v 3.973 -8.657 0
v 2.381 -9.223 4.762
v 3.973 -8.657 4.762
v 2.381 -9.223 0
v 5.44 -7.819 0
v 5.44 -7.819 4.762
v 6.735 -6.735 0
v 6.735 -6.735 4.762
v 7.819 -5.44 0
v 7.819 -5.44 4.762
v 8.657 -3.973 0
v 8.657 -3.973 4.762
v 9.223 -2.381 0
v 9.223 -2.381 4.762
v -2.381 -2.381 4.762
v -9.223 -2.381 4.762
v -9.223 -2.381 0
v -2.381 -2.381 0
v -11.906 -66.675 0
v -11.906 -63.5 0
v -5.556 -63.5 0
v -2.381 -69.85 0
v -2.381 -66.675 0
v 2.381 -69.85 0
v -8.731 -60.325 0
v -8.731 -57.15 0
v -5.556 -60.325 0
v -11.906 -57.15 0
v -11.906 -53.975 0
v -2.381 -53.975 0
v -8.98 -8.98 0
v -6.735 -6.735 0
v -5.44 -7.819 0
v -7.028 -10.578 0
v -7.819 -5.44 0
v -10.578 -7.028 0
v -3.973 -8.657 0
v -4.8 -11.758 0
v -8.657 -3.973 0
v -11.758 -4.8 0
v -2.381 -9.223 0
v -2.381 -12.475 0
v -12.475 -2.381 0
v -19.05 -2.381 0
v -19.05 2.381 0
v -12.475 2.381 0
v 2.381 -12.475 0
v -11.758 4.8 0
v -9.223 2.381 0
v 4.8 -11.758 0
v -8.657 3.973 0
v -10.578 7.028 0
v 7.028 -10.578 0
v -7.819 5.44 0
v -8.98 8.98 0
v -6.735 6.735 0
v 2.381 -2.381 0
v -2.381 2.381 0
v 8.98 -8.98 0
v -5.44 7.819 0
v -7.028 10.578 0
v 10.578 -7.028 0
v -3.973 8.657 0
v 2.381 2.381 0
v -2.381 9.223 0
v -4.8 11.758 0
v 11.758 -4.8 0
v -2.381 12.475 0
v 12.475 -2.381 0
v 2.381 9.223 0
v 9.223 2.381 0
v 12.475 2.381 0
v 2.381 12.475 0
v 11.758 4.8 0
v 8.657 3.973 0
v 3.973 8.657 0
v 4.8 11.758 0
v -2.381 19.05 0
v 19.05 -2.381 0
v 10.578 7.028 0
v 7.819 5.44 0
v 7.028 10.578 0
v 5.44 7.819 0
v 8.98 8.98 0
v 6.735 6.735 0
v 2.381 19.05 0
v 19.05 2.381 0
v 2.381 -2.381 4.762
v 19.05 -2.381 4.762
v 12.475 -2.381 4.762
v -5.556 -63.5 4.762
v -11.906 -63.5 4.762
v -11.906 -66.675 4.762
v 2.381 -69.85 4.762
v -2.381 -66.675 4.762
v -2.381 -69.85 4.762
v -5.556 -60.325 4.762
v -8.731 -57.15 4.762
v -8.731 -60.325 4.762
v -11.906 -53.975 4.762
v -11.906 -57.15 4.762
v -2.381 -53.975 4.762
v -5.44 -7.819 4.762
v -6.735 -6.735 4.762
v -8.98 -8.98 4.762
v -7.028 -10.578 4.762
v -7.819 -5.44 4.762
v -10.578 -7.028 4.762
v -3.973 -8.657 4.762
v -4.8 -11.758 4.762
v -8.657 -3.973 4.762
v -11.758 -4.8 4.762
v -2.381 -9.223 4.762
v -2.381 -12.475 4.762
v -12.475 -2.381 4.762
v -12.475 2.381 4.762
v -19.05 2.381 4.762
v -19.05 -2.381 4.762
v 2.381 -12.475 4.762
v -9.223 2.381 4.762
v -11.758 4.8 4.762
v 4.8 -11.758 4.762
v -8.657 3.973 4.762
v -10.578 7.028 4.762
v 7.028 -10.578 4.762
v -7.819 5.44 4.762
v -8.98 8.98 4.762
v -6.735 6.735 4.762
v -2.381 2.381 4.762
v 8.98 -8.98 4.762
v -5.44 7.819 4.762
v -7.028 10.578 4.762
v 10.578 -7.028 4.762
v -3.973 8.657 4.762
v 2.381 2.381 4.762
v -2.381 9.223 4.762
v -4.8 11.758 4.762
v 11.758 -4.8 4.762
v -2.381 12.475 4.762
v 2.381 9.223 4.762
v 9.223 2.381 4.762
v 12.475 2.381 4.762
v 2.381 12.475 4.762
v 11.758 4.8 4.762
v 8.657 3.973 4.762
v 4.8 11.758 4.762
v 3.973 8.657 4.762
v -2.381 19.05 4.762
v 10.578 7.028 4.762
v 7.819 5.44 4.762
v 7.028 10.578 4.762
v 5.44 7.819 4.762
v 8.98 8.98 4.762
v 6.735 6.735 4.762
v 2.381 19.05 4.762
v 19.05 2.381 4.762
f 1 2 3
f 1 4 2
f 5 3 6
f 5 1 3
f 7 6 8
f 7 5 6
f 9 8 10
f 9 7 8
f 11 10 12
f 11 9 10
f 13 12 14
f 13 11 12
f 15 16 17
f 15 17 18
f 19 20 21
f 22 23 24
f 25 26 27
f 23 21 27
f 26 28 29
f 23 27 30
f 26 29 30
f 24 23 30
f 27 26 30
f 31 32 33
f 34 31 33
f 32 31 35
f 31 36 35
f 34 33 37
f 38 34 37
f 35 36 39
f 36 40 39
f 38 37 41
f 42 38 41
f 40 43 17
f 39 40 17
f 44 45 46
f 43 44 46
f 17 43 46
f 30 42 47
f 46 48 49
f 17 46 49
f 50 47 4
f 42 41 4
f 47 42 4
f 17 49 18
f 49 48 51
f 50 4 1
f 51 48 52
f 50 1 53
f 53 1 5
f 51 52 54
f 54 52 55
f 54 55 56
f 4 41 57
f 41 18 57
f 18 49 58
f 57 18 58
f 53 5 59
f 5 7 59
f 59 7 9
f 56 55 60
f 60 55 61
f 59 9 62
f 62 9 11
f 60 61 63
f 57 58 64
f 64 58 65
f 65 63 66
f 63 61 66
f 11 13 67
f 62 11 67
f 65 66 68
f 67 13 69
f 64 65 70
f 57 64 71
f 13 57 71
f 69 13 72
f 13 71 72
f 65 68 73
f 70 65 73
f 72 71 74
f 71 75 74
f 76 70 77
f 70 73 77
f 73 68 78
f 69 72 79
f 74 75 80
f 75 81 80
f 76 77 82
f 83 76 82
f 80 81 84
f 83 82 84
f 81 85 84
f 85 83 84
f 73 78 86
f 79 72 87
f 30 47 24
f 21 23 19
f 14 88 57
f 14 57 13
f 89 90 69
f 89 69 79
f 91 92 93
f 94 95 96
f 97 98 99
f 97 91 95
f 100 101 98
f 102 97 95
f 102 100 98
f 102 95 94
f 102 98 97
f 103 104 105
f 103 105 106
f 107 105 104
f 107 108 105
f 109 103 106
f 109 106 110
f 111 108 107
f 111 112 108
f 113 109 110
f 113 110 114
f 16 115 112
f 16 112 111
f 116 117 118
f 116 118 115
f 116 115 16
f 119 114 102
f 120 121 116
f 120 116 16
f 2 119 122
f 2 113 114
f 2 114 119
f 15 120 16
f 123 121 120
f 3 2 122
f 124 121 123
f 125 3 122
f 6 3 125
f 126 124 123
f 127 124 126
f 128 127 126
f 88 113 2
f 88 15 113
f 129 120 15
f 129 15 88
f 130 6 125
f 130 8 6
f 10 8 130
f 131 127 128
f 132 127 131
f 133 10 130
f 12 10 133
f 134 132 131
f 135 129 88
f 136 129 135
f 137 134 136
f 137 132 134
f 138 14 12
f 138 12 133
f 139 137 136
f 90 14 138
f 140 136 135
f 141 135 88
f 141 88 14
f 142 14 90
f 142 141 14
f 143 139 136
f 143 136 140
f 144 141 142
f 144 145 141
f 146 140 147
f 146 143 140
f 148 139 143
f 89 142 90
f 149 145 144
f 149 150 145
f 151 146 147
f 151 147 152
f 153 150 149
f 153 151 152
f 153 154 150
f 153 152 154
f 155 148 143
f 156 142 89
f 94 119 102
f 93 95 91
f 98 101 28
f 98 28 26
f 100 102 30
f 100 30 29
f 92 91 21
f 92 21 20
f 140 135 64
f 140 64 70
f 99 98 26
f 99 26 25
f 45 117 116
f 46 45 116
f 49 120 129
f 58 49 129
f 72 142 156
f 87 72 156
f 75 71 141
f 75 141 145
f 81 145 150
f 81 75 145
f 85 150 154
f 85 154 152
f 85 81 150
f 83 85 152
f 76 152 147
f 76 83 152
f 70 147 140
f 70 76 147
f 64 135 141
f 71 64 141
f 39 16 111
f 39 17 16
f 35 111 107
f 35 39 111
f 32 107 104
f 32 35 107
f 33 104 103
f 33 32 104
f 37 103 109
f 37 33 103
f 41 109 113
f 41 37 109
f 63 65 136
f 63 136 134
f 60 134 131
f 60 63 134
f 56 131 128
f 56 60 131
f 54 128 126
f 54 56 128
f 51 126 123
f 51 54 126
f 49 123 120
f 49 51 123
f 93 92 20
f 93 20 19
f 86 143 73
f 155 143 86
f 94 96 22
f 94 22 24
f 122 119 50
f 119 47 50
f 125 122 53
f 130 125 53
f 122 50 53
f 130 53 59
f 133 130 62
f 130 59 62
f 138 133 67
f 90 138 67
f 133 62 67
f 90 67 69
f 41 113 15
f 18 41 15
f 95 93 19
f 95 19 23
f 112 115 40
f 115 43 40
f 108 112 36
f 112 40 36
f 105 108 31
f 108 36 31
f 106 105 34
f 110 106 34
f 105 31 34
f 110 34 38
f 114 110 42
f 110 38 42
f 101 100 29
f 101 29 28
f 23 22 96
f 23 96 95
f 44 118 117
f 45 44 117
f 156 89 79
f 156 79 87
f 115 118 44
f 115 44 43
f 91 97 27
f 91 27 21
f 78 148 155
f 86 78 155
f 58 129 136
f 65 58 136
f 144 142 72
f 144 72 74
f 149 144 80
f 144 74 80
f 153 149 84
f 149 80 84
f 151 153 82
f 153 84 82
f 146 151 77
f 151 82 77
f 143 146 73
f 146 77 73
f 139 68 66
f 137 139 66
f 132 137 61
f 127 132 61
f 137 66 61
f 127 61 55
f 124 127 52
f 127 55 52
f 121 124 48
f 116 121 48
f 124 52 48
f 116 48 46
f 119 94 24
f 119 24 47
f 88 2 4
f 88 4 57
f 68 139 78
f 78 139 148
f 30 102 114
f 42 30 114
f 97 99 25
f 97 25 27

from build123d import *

# Parameters (mm, degrees)
F0_R     = 12.7
F0_R_2   = 9.525
F1_DEPTH = 4.7625
F2_W     = 38.1
F2_H     = 4.7625
F3_DEPTH = 4.7625
F4_W     = 4.7625
F4_H     = 88.9
F5_DEPTH = 4.7625
F7_DEPTH = 4.7625


with BuildPart() as f1:
    # F0 (on Top) → F1 (new body)
    with BuildSketch(Plane.XY):
        Circle(F0_R)
        Circle(F0_R_2, mode=Mode.SUBTRACT)
    extrude(amount=F1_DEPTH)

    # F2 (on face) → F3 (join)
    with BuildSketch(Plane.XY.offset(4.7625)):
        Rectangle(F2_W, F2_H)
    extrude(amount=-F3_DEPTH)

    # F4 (on face) → F5 (join)
    with BuildSketch(Plane.XY.offset(4.7625)):
        with Locations((0, -25.4)):
            Rectangle(F4_W, F4_H)
    extrude(amount=-F5_DEPTH)

    # F6 (on face) → F7 (join)
    with BuildSketch(Plane.XY.offset(4.7625)):
        Polygon((-2.38125, -66.675), (-2.38125, -53.975), (-11.90625, -53.975), (-11.90625, -57.15), (-8.73125, -57.15), (-8.73125, -60.325), (-5.55625, -60.325), (-5.55625, -63.5), (-11.90625, -63.5), (-11.90625, -66.675), align=None)
    extrude(amount=-F7_DEPTH)


solid = f1.part
